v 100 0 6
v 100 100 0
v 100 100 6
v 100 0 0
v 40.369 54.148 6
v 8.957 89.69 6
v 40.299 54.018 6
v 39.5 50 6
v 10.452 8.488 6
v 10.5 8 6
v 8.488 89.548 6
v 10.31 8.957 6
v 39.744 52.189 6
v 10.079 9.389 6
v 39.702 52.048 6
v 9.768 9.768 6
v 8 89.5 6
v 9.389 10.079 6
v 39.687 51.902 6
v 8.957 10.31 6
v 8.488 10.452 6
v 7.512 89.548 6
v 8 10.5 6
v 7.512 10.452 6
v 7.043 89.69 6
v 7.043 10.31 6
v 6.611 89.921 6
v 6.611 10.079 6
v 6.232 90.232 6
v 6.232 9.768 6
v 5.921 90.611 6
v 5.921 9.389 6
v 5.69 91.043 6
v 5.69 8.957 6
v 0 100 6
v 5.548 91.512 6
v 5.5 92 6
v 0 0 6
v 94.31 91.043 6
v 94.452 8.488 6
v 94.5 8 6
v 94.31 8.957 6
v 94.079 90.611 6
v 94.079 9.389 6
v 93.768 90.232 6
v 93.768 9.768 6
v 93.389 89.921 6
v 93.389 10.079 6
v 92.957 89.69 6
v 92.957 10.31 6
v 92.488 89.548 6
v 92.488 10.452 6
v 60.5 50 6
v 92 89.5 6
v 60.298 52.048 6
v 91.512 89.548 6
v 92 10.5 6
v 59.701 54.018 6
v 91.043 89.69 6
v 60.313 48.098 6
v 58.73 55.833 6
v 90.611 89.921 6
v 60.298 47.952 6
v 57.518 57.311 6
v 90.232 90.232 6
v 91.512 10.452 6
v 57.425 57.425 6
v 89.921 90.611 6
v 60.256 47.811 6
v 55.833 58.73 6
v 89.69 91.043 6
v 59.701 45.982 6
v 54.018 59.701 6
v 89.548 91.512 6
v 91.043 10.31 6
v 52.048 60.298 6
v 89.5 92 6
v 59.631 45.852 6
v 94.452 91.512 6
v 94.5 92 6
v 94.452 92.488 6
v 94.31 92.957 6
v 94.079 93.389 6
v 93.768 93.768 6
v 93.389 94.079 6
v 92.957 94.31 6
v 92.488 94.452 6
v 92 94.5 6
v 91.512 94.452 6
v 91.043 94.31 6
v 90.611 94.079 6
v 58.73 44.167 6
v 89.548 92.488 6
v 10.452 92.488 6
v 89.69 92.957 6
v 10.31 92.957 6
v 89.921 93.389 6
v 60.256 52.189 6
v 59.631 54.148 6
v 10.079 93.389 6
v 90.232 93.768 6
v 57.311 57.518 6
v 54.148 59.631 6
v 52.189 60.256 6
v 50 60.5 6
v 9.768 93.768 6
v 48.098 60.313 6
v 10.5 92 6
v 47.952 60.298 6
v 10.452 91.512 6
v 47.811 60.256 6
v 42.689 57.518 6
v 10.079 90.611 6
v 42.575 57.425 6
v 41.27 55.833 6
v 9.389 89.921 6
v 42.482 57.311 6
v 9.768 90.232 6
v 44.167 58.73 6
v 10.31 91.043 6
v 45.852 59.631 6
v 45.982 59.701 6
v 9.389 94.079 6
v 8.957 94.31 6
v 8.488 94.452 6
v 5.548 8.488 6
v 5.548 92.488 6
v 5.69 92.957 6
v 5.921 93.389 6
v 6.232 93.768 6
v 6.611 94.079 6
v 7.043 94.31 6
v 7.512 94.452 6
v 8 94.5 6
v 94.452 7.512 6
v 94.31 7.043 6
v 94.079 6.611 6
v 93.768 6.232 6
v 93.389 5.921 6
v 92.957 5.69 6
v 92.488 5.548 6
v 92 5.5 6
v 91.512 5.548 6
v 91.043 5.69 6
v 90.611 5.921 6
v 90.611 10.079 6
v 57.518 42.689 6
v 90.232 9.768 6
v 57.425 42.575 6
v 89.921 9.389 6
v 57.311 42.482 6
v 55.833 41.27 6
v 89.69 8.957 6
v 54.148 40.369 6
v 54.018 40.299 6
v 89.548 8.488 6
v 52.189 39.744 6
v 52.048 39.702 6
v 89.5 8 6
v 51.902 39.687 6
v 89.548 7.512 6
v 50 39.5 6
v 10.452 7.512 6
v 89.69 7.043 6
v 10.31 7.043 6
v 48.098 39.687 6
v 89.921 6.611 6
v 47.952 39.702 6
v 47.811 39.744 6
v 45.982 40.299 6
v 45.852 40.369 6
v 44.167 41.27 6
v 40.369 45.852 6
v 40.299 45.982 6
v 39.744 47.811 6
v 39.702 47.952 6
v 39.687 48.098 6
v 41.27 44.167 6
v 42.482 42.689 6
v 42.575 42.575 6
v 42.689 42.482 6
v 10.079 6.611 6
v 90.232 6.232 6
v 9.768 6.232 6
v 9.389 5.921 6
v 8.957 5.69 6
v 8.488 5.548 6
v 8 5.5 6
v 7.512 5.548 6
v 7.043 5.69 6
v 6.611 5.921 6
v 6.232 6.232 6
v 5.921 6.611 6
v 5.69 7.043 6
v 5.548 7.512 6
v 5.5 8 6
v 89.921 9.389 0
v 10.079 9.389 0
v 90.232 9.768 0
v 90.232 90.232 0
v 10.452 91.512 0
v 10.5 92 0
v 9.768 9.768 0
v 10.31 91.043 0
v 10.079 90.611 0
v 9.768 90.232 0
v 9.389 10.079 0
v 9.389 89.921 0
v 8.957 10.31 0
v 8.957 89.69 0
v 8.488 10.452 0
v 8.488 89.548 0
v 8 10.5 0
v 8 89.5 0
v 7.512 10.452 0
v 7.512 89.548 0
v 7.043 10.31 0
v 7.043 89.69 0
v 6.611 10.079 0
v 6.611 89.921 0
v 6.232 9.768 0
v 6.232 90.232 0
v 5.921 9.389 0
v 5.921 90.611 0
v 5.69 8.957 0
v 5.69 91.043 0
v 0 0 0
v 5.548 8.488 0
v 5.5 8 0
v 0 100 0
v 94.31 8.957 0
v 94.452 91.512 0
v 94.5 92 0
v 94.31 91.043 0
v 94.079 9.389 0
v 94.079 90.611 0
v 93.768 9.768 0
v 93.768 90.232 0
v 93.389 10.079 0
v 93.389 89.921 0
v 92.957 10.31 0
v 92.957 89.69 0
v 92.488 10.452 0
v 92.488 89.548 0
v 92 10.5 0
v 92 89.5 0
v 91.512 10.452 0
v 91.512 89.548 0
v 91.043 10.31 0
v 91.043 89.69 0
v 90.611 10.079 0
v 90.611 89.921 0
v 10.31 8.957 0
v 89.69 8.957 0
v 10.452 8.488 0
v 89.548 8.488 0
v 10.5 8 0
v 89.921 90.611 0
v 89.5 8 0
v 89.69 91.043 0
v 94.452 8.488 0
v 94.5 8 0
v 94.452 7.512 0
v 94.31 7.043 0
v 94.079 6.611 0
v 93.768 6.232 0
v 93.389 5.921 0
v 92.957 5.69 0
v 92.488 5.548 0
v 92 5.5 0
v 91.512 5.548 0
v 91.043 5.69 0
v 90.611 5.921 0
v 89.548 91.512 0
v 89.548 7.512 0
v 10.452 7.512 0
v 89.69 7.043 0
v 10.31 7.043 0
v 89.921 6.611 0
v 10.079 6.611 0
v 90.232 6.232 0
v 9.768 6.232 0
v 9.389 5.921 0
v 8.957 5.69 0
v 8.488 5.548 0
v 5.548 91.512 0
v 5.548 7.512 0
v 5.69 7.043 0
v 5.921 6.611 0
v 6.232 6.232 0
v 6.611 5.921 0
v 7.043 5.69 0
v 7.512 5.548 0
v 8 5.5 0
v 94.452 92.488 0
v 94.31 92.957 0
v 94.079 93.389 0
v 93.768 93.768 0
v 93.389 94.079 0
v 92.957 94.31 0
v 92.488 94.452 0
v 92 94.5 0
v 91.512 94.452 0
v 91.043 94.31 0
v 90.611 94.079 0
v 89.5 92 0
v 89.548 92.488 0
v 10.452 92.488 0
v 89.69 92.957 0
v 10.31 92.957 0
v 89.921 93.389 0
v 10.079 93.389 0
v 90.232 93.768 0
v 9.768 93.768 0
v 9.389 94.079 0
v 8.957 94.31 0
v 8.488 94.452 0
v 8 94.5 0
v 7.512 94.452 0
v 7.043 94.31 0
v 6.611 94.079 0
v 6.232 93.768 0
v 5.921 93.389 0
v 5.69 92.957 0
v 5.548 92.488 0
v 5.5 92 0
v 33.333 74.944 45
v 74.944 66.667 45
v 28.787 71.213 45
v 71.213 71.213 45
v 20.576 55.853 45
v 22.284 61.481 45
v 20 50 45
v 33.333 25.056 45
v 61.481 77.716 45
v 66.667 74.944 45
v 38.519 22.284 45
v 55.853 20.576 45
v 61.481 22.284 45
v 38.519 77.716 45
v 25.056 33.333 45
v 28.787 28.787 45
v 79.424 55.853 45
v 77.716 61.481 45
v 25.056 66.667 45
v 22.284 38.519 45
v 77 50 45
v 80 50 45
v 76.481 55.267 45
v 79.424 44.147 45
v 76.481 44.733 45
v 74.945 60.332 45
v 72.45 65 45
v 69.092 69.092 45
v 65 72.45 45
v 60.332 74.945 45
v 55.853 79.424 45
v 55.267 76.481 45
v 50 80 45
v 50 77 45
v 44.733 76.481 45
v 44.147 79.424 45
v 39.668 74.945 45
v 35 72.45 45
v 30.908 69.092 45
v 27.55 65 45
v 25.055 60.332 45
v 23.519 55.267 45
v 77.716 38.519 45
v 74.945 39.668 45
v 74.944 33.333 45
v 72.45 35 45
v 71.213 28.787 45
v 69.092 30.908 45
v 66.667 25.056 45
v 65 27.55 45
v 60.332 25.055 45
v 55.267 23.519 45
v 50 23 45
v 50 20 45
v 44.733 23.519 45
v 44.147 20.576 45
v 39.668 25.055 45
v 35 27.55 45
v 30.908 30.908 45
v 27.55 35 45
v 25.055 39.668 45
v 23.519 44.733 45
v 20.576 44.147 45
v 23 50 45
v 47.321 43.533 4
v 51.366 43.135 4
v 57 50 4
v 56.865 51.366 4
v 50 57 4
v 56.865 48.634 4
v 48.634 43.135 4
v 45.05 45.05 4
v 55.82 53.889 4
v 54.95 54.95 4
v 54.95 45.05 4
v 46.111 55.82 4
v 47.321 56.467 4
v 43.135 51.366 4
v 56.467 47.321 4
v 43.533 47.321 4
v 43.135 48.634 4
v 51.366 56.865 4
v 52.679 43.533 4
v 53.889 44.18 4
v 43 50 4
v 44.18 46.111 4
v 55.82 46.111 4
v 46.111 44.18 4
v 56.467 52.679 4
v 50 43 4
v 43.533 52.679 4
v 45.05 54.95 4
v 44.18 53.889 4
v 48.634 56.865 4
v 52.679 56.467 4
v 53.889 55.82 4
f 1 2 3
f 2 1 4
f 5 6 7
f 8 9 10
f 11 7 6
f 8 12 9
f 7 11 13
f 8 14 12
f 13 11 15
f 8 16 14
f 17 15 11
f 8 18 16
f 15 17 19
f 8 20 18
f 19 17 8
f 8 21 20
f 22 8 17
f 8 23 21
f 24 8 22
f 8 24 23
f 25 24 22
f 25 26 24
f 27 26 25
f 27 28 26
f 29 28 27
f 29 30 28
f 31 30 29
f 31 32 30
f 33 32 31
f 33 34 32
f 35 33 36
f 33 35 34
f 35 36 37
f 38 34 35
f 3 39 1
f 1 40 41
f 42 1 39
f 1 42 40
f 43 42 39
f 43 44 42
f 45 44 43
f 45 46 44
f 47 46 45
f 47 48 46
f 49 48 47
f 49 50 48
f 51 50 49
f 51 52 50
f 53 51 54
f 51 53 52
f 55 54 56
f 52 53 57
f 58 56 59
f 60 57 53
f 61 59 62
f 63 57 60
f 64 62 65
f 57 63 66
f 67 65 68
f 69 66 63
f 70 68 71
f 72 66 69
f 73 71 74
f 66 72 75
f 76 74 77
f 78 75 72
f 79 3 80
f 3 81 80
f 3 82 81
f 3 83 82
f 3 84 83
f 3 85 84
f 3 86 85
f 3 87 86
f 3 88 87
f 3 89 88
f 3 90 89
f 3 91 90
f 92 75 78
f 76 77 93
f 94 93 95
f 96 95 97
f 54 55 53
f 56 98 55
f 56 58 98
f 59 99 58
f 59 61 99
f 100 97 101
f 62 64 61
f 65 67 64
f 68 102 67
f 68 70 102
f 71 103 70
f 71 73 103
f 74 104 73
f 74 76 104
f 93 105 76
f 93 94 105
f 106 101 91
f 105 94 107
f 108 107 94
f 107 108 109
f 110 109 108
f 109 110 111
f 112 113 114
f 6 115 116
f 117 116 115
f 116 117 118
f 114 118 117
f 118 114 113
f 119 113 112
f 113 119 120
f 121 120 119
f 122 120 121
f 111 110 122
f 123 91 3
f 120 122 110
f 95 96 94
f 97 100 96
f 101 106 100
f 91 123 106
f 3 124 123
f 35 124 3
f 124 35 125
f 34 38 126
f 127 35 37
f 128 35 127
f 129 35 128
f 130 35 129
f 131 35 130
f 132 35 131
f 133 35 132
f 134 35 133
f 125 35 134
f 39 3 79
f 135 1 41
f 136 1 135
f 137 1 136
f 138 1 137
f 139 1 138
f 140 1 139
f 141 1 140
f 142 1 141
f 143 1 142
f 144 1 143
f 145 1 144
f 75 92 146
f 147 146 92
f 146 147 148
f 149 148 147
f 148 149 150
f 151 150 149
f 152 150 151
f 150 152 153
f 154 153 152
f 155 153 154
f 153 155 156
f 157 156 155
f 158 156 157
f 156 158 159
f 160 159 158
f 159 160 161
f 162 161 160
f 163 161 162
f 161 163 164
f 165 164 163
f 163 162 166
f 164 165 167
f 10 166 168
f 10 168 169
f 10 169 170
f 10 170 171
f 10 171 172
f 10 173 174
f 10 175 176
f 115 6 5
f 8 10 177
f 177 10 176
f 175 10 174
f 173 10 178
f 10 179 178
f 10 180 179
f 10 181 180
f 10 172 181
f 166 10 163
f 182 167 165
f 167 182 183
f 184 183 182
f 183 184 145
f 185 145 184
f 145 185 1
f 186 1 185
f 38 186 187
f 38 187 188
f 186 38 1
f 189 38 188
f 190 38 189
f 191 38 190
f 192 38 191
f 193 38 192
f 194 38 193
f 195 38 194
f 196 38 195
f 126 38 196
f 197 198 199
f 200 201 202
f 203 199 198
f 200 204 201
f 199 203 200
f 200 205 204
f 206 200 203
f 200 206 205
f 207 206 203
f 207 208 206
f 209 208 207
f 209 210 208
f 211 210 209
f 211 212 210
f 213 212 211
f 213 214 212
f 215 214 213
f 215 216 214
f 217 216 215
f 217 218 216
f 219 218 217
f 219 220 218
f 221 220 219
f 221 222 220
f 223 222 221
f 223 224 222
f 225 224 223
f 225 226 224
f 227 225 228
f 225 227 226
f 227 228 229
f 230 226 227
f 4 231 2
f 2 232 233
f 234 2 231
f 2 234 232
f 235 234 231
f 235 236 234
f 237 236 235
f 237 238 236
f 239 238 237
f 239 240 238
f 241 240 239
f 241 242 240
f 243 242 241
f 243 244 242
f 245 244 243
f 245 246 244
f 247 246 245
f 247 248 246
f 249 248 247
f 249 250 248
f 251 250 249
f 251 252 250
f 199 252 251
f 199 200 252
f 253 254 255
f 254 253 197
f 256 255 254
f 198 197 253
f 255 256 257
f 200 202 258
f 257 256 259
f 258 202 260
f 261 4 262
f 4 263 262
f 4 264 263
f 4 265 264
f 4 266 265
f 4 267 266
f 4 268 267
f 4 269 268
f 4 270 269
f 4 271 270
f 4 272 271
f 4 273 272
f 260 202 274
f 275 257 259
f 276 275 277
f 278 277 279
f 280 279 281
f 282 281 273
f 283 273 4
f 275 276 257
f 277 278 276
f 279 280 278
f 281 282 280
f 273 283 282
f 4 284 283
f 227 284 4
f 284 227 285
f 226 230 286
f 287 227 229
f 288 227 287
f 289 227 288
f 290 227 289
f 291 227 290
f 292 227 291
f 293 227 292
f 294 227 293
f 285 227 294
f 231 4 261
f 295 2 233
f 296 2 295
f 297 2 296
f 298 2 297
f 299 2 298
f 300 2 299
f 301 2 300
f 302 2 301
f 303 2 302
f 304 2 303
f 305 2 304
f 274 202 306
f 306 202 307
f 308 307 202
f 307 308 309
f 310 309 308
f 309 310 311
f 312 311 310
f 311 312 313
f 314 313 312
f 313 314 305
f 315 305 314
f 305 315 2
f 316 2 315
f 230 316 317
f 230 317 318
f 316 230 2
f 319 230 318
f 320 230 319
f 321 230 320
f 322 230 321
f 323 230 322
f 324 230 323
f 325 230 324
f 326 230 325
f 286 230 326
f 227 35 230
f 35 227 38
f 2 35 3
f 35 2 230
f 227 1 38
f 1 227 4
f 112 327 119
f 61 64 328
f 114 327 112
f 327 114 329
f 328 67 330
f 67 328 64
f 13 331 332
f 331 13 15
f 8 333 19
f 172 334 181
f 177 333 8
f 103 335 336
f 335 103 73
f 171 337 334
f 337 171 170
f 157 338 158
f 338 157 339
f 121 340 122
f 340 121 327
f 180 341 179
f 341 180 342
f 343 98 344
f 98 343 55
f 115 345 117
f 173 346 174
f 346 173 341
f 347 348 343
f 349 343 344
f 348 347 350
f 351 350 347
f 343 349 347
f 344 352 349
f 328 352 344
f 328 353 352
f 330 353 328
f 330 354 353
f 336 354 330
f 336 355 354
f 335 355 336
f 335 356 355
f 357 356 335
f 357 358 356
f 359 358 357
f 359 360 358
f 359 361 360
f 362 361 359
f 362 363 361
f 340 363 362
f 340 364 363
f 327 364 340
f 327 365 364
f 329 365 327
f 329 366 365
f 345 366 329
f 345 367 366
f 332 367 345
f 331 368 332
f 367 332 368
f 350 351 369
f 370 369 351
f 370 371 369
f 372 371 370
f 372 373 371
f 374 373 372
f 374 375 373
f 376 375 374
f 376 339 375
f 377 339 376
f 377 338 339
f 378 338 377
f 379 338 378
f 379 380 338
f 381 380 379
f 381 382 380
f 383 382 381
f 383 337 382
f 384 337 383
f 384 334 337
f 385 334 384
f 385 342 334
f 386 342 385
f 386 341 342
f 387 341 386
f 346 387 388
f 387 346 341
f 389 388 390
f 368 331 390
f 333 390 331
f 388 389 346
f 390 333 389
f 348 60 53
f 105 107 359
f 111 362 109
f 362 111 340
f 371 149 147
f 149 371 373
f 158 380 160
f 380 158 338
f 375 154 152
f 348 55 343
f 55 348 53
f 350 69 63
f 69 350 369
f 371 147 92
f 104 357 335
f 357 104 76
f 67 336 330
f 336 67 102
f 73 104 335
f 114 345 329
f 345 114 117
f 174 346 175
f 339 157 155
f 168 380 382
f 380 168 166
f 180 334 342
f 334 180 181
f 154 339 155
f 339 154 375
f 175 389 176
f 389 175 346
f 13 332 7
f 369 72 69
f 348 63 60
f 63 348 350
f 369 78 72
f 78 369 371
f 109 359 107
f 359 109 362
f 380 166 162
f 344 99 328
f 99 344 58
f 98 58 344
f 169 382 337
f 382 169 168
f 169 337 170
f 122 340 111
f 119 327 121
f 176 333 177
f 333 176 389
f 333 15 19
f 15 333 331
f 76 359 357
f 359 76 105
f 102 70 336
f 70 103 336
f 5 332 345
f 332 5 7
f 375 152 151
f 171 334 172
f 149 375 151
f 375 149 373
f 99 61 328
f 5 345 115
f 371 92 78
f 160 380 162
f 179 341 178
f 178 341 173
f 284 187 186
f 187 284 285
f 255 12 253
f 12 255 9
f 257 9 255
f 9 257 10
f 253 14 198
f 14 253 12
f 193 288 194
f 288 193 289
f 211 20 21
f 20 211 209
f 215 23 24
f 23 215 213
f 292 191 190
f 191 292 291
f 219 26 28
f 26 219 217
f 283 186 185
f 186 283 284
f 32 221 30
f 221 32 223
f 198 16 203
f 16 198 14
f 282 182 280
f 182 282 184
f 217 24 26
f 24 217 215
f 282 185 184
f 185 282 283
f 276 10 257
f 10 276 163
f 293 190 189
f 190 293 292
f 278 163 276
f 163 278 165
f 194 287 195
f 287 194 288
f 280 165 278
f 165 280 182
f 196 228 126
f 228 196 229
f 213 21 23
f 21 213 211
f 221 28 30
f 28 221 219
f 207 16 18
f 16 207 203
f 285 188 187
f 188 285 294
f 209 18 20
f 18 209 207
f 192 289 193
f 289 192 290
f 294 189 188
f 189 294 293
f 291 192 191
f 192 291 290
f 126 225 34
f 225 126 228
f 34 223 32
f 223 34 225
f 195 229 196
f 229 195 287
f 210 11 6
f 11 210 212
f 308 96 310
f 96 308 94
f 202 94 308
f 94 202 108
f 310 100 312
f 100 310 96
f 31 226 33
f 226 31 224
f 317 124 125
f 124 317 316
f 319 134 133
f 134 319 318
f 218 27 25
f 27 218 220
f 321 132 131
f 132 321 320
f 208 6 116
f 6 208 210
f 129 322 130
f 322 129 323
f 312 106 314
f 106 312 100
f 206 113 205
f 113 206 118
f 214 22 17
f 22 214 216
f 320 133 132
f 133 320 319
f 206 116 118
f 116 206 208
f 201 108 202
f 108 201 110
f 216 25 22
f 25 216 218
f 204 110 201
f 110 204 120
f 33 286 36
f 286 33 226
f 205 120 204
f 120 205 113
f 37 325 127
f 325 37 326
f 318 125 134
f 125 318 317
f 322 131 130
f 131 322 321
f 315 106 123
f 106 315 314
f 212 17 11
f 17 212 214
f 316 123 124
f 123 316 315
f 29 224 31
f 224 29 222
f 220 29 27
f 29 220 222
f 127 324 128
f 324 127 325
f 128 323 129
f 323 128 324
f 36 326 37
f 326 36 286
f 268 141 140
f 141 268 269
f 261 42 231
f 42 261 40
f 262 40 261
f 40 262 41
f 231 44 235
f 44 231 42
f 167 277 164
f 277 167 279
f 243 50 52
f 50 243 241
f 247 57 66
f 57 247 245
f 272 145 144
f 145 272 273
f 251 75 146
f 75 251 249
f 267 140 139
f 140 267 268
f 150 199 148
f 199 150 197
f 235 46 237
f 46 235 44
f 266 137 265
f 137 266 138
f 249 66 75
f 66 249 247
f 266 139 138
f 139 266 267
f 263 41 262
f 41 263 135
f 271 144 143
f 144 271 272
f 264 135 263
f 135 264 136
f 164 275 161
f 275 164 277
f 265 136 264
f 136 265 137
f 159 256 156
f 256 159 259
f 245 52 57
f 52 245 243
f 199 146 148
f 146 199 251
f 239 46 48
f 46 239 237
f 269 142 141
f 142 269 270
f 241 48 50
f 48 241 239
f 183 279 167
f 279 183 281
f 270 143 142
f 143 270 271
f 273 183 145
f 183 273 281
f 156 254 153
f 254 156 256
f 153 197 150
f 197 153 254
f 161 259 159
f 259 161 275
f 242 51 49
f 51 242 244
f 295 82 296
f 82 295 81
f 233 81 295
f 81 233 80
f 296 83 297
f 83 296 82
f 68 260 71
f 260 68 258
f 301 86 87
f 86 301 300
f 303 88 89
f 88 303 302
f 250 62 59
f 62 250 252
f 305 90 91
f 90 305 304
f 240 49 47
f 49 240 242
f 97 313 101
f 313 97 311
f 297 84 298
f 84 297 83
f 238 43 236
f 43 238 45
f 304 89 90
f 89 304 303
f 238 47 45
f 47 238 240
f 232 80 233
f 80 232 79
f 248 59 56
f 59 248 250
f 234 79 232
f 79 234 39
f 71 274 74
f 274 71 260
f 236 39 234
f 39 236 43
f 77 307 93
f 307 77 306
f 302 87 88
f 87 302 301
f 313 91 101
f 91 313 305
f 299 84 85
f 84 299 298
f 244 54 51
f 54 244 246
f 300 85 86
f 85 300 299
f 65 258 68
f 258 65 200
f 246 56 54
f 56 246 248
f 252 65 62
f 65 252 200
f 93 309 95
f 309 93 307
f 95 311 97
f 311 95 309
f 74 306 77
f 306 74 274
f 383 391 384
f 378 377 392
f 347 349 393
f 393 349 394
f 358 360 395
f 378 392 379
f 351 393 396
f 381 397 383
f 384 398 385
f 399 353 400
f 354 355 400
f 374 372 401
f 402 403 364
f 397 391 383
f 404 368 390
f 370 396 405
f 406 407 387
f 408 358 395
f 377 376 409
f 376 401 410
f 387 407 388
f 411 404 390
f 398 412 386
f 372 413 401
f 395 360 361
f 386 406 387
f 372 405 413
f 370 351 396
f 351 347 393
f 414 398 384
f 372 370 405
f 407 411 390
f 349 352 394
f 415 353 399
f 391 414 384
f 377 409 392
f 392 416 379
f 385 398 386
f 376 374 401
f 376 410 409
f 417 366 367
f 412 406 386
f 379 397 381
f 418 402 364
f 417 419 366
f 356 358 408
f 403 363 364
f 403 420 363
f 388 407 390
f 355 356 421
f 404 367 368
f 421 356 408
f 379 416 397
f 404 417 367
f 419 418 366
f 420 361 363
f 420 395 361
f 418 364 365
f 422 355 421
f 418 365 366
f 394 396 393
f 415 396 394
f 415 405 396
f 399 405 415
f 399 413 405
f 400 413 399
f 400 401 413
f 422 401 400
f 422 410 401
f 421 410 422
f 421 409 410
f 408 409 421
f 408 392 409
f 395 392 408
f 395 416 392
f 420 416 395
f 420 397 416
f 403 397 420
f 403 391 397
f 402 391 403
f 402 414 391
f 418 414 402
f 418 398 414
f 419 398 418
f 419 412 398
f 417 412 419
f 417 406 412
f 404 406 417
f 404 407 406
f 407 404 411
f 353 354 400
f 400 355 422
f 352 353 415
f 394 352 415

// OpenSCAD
$fn = 32;

// ----------------------------------------------------------------------
// Hopper: flanged with square flange
// ----------------------------------------------------------------------

// --- parameters (mm) ---
fl = 100;                 // flange side, X and Y
fl_t = 6;                 // flange thickness
cone_h = 40;              // cone height above the flange
top_d = 60;               // cone mouth diameter
bot_d = 20;               // cone spout diameter
wall = 3;                 // cone wall thickness
hole_r = 2.5;             // flange hole radius
hole_in = 8;              // hole inset from the corners

bore_d = bot_d - 2 * wall;  // spout bore diameter
total_h = fl_t + cone_h - 1;  // overall height

difference() {
  union() {
    cube([fl, fl, fl_t]);
    translate([fl / 2, fl / 2, fl_t - 1])
      cylinder(h = cone_h, d1 = bot_d, d2 = top_d);
  }
  translate([fl / 2, fl / 2, fl_t - 2])
    cylinder(h = cone_h + 1, d1 = bore_d, d2 = top_d - 2 * wall);
  for (sx = [0, 1], sy = [0, 1])
    translate([sx ? fl - hole_in : hole_in,
               sy ? fl - hole_in : hole_in, -1])
      cylinder(r = hole_r, h = fl_t + 2);
}
